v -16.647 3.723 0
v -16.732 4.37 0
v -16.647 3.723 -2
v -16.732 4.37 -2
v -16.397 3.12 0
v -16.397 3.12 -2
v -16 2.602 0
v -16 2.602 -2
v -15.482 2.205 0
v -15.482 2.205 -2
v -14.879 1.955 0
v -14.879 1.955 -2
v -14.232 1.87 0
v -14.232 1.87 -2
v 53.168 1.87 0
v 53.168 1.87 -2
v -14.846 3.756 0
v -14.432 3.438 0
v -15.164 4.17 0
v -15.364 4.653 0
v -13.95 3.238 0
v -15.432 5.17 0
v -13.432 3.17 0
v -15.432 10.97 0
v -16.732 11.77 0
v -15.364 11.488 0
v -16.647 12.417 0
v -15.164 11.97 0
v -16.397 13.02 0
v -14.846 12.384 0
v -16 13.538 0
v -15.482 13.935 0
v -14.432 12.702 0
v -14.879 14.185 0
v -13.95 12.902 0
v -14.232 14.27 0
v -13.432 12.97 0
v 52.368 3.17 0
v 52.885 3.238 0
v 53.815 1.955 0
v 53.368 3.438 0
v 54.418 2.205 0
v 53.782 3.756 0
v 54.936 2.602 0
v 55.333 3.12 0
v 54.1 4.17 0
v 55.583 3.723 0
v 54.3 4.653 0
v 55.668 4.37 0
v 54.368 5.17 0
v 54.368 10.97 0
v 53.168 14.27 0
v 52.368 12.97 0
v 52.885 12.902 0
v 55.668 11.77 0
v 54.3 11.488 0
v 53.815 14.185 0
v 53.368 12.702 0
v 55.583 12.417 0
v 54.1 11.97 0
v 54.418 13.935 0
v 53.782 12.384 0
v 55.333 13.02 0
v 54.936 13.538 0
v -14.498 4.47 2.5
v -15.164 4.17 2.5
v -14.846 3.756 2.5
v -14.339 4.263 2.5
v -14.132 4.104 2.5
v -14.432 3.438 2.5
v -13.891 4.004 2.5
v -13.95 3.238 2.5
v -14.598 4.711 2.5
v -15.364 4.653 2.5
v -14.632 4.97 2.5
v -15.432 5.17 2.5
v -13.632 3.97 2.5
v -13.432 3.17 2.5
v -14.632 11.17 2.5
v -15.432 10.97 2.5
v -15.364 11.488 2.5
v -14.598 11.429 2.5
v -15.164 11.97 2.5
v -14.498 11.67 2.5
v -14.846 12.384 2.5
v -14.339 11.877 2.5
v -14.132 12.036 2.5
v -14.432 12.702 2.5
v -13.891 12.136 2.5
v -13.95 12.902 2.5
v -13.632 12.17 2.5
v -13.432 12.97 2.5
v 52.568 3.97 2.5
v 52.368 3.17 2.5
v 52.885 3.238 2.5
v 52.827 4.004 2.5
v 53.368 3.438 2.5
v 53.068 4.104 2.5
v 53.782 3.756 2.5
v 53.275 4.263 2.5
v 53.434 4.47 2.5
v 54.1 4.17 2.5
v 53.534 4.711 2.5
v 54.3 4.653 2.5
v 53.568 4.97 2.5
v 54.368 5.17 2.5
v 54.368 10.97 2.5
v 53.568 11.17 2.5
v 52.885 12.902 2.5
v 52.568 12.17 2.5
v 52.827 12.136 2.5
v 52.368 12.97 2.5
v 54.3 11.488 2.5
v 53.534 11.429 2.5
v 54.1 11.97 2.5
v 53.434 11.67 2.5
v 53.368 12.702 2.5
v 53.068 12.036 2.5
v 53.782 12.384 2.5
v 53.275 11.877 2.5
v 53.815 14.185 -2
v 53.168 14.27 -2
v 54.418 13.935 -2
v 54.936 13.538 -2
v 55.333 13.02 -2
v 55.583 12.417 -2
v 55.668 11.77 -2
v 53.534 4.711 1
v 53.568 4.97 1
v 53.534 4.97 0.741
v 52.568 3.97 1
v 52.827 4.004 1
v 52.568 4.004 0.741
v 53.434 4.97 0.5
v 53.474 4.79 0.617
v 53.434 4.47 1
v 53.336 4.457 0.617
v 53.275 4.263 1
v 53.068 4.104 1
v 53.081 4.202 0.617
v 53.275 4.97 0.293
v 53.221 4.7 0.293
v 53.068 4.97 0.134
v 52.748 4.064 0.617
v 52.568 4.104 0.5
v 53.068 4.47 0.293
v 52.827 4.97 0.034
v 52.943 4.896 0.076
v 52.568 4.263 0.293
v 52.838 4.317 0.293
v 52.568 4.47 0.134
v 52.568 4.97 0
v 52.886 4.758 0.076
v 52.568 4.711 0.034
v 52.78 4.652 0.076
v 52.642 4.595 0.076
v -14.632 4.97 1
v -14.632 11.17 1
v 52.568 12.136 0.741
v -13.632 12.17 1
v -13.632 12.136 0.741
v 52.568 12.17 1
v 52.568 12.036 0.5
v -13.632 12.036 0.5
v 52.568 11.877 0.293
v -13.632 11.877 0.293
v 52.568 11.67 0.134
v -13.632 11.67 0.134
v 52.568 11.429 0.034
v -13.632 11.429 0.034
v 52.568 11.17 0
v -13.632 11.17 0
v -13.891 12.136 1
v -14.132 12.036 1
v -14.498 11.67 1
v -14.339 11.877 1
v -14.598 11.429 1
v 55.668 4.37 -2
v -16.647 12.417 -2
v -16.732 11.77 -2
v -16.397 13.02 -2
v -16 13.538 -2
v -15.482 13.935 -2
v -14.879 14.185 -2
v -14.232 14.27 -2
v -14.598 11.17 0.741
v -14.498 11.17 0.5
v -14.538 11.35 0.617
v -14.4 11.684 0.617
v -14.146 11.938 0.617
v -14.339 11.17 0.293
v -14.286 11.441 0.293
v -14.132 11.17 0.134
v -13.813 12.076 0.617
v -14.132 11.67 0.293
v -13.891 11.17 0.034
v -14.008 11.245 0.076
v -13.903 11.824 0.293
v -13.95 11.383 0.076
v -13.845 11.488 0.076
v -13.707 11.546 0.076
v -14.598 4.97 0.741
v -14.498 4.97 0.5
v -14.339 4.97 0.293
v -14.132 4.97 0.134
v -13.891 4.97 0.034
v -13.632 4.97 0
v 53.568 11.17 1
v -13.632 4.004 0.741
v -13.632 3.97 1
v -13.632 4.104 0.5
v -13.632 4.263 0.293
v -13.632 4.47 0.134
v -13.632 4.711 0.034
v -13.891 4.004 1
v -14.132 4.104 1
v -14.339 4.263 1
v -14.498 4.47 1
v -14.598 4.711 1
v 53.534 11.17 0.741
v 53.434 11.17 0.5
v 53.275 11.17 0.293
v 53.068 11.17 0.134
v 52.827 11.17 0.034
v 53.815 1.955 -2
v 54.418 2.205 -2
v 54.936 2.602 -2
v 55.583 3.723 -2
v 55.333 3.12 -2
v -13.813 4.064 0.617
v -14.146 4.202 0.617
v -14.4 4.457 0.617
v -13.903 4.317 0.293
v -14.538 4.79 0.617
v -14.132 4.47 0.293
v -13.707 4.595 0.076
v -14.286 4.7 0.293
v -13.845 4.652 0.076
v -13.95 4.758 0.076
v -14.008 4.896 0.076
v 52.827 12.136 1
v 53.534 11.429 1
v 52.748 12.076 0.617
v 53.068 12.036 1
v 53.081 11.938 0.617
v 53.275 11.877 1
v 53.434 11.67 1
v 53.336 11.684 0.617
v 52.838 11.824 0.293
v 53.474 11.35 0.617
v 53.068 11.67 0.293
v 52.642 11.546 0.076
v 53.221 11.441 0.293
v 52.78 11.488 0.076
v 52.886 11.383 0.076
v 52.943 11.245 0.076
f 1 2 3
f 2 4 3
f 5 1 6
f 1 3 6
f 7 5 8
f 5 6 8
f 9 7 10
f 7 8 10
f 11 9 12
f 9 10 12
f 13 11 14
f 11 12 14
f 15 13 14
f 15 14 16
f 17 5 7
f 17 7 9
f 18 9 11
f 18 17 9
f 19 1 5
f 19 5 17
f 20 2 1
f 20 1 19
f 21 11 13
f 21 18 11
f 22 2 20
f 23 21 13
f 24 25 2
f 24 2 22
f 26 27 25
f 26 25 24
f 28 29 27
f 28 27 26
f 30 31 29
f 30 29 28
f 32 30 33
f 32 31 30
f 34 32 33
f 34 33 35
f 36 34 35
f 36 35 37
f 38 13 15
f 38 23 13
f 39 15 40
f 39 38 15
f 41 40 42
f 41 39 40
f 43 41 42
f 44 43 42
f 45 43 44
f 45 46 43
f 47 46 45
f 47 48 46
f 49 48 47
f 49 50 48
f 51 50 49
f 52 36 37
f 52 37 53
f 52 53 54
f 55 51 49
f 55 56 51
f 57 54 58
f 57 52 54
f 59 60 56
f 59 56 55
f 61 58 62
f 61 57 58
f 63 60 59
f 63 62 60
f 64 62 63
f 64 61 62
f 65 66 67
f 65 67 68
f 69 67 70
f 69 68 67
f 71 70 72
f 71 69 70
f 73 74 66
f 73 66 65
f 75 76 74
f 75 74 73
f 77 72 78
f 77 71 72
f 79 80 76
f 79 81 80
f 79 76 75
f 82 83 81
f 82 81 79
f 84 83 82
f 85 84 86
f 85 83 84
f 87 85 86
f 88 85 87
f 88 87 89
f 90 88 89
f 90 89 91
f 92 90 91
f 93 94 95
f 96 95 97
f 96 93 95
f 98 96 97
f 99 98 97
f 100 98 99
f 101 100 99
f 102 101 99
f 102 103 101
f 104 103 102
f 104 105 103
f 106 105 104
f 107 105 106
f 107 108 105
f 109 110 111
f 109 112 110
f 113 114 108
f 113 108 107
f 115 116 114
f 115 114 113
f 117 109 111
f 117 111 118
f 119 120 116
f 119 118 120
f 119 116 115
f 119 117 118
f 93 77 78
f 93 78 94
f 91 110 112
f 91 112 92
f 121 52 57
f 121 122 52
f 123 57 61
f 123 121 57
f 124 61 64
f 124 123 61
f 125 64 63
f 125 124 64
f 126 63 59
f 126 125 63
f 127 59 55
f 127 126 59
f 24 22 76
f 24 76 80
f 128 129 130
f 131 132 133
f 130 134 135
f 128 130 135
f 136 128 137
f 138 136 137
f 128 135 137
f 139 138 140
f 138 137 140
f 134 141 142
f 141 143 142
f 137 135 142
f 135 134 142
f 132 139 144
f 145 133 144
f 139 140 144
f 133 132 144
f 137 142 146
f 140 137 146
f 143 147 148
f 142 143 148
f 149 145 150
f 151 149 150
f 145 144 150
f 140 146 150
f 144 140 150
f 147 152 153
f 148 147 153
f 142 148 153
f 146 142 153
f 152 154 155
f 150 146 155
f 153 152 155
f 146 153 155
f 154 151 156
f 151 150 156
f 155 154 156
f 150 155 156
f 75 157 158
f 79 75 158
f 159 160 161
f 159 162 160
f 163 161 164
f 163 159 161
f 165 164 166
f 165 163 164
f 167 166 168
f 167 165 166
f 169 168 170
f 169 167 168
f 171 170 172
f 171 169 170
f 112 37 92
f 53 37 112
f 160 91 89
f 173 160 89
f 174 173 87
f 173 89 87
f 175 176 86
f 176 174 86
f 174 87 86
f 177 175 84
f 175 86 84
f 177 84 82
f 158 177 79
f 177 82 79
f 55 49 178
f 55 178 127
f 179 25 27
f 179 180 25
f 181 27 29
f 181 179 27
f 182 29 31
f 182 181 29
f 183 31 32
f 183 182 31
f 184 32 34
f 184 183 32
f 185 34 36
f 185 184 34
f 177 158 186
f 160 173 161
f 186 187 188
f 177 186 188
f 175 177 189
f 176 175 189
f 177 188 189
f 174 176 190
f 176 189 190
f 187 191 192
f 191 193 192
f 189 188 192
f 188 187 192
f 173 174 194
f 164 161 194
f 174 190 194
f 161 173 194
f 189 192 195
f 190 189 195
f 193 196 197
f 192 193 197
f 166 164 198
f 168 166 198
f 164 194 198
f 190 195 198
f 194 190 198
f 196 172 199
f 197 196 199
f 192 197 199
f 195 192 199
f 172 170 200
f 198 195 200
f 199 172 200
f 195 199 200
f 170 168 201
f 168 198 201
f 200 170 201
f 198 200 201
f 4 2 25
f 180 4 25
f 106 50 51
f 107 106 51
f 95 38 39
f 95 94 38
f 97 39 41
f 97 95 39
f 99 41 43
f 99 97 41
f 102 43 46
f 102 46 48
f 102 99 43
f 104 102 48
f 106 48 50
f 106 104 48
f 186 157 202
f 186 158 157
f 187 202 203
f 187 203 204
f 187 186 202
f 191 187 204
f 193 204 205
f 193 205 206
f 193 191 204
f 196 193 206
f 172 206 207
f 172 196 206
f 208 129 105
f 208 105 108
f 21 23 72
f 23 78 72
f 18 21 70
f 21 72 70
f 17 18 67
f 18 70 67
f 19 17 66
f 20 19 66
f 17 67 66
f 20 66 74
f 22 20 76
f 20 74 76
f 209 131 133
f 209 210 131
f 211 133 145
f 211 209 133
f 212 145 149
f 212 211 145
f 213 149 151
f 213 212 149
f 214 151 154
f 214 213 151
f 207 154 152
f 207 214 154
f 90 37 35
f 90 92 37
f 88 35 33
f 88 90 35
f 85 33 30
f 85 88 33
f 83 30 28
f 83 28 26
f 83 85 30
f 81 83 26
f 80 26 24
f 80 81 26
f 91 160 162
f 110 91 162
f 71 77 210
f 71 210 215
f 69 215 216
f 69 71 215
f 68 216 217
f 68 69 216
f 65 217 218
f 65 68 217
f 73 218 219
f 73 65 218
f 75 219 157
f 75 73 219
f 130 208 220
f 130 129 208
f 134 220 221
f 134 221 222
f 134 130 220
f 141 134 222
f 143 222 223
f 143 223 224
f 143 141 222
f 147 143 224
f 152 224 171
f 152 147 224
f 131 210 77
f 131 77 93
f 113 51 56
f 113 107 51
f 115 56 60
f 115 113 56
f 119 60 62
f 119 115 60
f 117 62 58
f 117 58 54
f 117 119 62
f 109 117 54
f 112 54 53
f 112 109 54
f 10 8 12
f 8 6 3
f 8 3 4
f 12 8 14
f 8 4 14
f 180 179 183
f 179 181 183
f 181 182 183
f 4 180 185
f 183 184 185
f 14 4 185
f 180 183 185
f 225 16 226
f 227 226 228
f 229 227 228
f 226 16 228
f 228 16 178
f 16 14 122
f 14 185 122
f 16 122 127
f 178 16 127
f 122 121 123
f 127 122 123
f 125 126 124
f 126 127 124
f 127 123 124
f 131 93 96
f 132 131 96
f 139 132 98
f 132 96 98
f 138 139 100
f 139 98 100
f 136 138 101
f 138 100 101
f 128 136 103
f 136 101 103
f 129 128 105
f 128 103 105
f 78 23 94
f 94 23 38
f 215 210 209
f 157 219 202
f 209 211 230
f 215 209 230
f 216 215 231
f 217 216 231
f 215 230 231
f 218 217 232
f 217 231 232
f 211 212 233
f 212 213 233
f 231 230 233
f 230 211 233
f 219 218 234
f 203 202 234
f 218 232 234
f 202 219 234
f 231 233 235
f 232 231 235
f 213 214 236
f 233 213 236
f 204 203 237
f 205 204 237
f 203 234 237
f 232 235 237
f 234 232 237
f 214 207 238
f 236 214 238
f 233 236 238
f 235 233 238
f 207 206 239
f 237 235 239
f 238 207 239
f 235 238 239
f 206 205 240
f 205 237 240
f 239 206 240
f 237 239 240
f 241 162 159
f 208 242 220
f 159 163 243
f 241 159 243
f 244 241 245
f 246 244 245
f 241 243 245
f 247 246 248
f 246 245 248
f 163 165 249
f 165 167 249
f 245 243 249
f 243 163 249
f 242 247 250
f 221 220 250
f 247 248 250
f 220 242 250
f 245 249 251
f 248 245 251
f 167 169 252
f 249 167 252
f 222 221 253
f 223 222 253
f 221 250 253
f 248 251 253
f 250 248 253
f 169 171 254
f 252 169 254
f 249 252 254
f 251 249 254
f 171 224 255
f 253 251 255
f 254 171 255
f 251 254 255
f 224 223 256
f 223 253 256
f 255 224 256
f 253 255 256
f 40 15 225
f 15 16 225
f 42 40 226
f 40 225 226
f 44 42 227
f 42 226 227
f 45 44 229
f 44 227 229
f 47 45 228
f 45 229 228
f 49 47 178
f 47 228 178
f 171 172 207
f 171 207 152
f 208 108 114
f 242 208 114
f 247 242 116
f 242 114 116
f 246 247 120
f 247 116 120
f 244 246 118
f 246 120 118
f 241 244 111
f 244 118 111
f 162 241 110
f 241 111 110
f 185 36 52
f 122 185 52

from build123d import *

# Parameters (mm, degrees)
F0_W     = 72.4
F0_H     = 12.4
F0_W_2   = 69.8
F0_H_2   = 9.8
F0_W_3   = 68.2
F0_H_3   = 8.2
F1_DEPTH = 2
F2_DEPTH = 2.5
F3_R     = 2.5
F4_R     = 2
F5_R     = 1
F6_R     = 1


with BuildPart() as f1:
    # F0 (on Top) → F1 (new body)
    with BuildSketch(Plane.XY):
        with Locations((19.4677342524, 8.0702581361)):
            Rectangle(F0_W, F0_H)
        with Locations((19.4677342524, 8.0702581361)):
            Rectangle(F0_W_2, F0_H_2, mode=Mode.SUBTRACT)
        with Locations((19.4677342524, 8.0702581361)):
            Rectangle(F0_W_2, F0_H_2)
        with Locations((19.4677342524, 8.0702581361)):
            Rectangle(F0_W_3, F0_H_3, mode=Mode.SUBTRACT)
        with Locations((19.4677342524, 8.0702581361)):
            Rectangle(F0_W_3, F0_H_3)
    extrude(amount=-F1_DEPTH)

    # F0 (on Top) → F2 (join)
    with BuildSketch(Plane.XY):
        with Locations((19.4677342524, 8.0702581361)):
            Rectangle(F0_W_2, F0_H_2)
        with Locations((19.4677342524, 8.0702581361)):
            Rectangle(F0_W_3, F0_H_3, mode=Mode.SUBTRACT)
    extrude(amount=F2_DEPTH)

    # F3
    f3_edges = [f1.edges().sort_by_distance(p)[0] for p in [
        (-16.732266, 14.270258, -1),
        (-16.732266, 1.870258, -1),
        (55.667734, 14.270258, -1),
        (55.667734, 1.870258, -1),
    ]]
    fillet(f3_edges, radius=F3_R)

    # F4
    f4_edges = [f1.edges().sort_by_distance(p)[0] for p in [
        (54.367734, 12.970258, 1.25),
        (54.367734, 3.170258, 1.25),
        (-15.432266, 12.970258, 1.25),
        (-15.432266, 3.170258, 1.25),
    ]]
    fillet(f4_edges, radius=F4_R)

    # F5
    f5_edges = [f1.edges().sort_by_distance(p)[0] for p in [
        (53.567734, 3.970258, 1.25),
        (53.567734, 12.170258, 1.25),
        (-14.632266, 3.970258, 1.25),
        (-14.632266, 12.170258, 1.25),
    ]]
    fillet(f5_edges, radius=F5_R)

    # F6
    f6_edges = [f1.edges().sort_by_distance(p)[0] for p in [
        (19.467734, 12.170258, 0),
        (53.567734, 8.070258, 0),
        (19.467734, 3.970258, 0),
        (-14.632266, 8.070258, 0),
    ]]
    fillet(f6_edges, radius=F6_R)


solid = f1.part
